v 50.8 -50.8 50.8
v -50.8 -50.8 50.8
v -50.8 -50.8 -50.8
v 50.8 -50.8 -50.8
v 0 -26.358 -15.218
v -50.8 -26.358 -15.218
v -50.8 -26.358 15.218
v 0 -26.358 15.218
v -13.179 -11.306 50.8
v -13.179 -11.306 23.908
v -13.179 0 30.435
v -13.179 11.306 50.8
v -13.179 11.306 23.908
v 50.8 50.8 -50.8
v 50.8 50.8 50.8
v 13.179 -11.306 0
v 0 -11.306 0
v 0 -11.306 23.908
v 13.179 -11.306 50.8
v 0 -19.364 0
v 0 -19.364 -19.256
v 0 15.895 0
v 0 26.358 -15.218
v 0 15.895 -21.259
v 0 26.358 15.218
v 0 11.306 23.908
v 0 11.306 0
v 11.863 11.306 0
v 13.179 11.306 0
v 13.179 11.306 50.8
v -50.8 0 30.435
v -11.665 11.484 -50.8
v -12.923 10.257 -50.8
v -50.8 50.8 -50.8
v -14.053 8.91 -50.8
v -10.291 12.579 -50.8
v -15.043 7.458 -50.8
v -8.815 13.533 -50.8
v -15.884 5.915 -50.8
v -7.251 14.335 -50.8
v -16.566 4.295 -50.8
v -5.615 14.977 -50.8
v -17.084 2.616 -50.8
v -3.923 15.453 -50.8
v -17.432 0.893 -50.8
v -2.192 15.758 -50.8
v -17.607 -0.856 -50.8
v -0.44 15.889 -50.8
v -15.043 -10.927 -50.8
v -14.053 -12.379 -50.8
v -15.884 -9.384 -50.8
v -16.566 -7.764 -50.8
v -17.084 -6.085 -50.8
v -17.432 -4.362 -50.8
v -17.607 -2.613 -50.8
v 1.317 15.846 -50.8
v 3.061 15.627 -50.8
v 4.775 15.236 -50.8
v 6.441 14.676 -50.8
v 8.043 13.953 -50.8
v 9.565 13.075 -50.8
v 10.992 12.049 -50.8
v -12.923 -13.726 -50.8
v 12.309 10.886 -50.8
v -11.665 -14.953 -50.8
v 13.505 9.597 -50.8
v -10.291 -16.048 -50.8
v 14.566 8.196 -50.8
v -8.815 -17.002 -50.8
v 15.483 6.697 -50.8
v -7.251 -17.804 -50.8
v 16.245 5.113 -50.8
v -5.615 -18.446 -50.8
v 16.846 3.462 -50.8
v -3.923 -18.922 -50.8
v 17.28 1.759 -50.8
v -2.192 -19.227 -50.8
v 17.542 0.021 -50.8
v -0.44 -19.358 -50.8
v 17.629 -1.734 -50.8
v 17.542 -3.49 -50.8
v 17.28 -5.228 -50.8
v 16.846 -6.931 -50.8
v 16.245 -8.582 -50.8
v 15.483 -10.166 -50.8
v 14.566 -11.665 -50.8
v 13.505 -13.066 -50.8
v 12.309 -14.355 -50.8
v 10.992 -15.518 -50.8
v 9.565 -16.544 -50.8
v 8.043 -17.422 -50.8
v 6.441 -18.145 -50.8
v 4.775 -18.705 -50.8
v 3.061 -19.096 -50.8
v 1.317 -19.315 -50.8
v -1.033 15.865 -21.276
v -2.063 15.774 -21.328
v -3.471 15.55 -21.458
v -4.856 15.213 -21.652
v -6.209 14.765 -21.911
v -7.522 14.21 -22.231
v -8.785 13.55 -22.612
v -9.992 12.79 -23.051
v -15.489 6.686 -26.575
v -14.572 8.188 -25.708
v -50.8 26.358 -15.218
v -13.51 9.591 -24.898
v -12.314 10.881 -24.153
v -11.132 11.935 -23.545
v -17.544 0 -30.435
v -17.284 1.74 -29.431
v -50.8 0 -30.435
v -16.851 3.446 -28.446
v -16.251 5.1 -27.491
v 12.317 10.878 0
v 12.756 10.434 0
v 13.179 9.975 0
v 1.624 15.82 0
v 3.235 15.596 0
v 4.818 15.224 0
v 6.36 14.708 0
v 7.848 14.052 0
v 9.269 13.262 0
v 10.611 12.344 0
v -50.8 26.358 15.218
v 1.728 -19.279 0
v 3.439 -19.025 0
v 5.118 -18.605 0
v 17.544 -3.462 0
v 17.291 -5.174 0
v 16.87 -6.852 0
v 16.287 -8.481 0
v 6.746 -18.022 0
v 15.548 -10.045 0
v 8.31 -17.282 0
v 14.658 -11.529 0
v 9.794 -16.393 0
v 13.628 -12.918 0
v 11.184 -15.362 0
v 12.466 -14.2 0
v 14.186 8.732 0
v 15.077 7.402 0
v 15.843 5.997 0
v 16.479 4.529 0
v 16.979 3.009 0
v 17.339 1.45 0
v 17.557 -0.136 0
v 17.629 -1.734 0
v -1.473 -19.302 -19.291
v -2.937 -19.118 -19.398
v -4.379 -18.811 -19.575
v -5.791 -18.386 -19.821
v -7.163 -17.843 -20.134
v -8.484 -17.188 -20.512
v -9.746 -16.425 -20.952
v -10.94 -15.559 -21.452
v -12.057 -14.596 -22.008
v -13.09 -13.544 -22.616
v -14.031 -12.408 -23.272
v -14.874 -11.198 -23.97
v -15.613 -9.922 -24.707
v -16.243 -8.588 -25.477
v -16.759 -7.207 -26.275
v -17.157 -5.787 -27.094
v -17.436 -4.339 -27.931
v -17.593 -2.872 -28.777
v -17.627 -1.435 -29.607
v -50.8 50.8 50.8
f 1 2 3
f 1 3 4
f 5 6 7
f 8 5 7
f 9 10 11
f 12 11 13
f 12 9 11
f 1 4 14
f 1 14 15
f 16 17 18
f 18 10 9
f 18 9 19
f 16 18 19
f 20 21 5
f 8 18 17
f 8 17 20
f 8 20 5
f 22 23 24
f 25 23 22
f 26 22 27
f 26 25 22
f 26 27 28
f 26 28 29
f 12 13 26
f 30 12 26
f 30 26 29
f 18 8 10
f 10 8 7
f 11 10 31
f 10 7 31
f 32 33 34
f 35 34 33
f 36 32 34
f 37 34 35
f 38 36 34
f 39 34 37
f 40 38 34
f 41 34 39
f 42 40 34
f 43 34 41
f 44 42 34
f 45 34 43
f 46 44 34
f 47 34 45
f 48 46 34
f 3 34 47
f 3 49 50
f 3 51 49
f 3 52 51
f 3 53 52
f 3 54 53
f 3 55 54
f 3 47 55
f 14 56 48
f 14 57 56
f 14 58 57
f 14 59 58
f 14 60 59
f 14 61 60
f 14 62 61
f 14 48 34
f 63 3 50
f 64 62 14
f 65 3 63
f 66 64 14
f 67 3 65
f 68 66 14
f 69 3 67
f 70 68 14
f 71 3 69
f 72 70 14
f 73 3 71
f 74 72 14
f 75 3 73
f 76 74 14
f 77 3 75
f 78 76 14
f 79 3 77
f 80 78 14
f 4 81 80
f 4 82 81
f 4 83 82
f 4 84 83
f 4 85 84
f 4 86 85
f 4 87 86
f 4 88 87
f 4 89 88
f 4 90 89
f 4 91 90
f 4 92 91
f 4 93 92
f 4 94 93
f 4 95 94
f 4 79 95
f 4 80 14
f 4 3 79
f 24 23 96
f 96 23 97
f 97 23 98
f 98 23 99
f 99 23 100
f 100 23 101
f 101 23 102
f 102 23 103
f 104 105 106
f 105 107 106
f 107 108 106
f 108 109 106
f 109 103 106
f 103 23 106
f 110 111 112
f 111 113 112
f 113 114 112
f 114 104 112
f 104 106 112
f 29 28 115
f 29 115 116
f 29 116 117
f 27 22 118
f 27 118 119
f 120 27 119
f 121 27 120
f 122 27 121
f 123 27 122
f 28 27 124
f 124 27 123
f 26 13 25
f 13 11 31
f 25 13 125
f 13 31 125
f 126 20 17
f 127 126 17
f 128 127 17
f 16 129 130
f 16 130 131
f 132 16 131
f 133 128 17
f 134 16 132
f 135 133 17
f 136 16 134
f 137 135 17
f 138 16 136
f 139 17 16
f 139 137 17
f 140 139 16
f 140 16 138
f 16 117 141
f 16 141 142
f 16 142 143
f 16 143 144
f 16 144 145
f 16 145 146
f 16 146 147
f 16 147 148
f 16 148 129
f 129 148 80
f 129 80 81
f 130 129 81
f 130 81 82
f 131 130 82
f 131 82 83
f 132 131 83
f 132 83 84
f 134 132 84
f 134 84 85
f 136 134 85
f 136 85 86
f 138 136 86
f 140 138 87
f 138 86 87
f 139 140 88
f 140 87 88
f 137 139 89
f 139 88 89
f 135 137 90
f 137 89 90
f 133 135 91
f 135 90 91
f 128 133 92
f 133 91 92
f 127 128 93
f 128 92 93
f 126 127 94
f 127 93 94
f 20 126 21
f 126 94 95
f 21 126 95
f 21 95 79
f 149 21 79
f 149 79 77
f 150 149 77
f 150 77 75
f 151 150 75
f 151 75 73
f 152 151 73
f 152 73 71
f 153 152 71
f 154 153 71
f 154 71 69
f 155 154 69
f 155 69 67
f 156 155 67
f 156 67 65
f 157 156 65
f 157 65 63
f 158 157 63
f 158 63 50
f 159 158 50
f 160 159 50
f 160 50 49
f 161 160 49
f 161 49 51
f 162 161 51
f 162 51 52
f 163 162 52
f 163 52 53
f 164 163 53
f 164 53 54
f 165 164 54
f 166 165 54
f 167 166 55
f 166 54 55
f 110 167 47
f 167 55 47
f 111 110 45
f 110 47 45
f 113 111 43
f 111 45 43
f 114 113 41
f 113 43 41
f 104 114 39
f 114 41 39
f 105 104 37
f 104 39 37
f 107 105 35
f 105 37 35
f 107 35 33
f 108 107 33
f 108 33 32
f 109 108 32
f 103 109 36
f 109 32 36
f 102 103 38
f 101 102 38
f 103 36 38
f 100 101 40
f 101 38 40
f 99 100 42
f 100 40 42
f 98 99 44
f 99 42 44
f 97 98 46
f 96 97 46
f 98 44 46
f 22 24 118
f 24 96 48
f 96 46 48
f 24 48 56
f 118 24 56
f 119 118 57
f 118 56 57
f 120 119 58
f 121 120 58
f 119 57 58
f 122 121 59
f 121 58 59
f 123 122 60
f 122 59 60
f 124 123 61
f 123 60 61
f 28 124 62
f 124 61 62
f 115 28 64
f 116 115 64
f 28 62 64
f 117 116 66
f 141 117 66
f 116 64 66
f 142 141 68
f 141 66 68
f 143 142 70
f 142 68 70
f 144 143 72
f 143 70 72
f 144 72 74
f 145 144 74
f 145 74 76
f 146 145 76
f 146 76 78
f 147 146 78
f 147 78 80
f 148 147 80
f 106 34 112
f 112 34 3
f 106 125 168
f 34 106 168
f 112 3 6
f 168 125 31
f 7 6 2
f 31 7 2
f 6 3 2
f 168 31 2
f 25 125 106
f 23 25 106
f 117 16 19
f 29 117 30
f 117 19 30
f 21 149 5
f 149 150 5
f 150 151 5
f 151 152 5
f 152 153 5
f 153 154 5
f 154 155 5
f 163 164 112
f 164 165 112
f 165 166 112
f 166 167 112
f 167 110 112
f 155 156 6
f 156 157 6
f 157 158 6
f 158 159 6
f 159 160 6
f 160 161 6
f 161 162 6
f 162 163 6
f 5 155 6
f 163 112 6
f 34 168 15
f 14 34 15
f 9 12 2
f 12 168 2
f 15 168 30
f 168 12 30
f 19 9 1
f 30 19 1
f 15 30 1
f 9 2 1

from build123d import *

# Parameters (mm, degrees)
F1_W     = 101.6
F1_H     = 101.6
F2_DEPTH = 50.8
F3_W     = 26.3578668237
F3_H     = 22.6122755557
F4_DEPTH = 50.8
F5_R     = 17.6293811016
F6_DEPTH = 50.8
F8_DEPTH = 50.8


# Not quite as in the source:
# - a variable given as a bare number and used for a length is read in inches; the dataset says mm whatever the document's units were


with BuildPart() as f2:
    # F1 (on Front) → F2 (new body, symmetric)
    with BuildSketch(Plane.XZ):
        Rectangle(F1_W, F1_H)
    extrude(amount=F2_DEPTH, both=True)

    # F3 (on face) → F4 (cut)
    with BuildSketch(Plane.XY.offset(50.8)):
        Rectangle(F3_W, F3_H)
    extrude(amount=-F4_DEPTH, mode=Mode.SUBTRACT)

    # F5 (on face) → F6 (cut)
    with BuildSketch(Plane(origin=(0, 0, -50.8), x_dir=(1, 0, 0), z_dir=(0, 0, -1))):
        with Locations((0, 1.7344856169)):
            Circle(F5_R)
    extrude(amount=-F6_DEPTH, mode=Mode.SUBTRACT)

    # F7 (on face) → F8 (cut)
    with BuildSketch(Plane(origin=(-50.8, 0, 0), x_dir=(0, -1, 0), z_dir=(-1, 0, 0))):
        Polygon((26.357864961, -15.2177204305), (26.357864961, 15.2177204305), (0, 30.435440861), (-26.357864961, 15.2177204305), (-26.357864961, -15.2177204305), (0, -30.435440861), align=None)
    extrude(amount=-F8_DEPTH, mode=Mode.SUBTRACT)


solid = f2.part
